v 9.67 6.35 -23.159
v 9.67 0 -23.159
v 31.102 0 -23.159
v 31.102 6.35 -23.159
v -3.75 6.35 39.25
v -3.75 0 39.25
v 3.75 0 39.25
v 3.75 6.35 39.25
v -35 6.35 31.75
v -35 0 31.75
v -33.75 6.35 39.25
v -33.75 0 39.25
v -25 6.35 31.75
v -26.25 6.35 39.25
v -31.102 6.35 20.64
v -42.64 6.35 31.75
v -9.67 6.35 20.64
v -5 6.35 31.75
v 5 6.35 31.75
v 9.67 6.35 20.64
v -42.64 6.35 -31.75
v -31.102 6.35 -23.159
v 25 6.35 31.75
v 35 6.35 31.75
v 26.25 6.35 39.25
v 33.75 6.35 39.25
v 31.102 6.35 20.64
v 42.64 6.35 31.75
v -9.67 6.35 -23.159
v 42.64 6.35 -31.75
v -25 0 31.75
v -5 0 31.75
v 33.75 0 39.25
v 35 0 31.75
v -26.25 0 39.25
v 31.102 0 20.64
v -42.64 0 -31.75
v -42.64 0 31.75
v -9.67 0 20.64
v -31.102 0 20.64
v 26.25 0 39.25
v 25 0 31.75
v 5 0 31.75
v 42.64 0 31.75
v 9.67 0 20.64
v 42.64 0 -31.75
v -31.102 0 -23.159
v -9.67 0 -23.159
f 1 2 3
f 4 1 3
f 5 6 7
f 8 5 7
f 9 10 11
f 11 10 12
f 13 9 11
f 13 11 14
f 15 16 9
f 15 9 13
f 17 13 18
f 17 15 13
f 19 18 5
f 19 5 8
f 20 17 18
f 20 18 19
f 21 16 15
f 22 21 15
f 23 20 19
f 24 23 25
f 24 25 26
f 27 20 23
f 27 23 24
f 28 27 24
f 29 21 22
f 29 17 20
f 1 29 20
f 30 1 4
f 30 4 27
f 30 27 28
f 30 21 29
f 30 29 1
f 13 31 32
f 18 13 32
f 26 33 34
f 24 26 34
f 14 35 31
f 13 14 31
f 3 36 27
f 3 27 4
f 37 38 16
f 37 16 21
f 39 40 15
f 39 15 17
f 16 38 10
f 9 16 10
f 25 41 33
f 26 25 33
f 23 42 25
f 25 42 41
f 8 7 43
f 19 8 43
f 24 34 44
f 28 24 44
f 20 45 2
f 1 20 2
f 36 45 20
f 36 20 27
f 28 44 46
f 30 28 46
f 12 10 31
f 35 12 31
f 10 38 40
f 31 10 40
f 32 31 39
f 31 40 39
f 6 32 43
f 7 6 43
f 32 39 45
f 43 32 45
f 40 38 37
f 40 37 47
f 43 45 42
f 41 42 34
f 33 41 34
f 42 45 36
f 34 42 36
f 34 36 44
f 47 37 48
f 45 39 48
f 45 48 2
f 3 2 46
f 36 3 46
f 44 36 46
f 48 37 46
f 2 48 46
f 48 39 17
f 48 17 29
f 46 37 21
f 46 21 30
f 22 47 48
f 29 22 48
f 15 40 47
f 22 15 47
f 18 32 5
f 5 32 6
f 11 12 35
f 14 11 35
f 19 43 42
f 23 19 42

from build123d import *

# Parameters (mm, degrees)
SKETCH2_W           = 85.279590556
SKETCH2_H           = 63.5
SKETCH2_W_2         = 21.432451429
SKETCH2_H_2         = 43.79853014
BOSS_EXTRUDE1_DEPTH = 6.35


with BuildPart() as part:
    # Sketch2 → Boss-Extrude1 (new body)
    with BuildSketch(Plane(origin=(0, 0, 0), x_dir=(1, 0, 0), z_dir=(0, 1, 0))):
        Rectangle(SKETCH2_W, SKETCH2_H)
        with Locations((-20.38588495, 1.25966445)):
            Rectangle(SKETCH2_W_2, SKETCH2_H_2, mode=Mode.SUBTRACT)
        with Locations((20.38588495, 1.25966445)):
            Rectangle(SKETCH2_W_2, SKETCH2_H_2, mode=Mode.SUBTRACT)
        Polygon((-25, -31.75), (-35, -31.75), (-33.75, -39.25), (-26.25, -39.25), align=None)
        Polygon((5, -31.75), (-5, -31.75), (-3.75, -39.25), (3.75, -39.25), align=None)
        Polygon((33.75, -39.25), (35, -31.75), (25, -31.75), (26.25, -39.25), align=None)
    extrude(amount=BOSS_EXTRUDE1_DEPTH)


solid = part.part
